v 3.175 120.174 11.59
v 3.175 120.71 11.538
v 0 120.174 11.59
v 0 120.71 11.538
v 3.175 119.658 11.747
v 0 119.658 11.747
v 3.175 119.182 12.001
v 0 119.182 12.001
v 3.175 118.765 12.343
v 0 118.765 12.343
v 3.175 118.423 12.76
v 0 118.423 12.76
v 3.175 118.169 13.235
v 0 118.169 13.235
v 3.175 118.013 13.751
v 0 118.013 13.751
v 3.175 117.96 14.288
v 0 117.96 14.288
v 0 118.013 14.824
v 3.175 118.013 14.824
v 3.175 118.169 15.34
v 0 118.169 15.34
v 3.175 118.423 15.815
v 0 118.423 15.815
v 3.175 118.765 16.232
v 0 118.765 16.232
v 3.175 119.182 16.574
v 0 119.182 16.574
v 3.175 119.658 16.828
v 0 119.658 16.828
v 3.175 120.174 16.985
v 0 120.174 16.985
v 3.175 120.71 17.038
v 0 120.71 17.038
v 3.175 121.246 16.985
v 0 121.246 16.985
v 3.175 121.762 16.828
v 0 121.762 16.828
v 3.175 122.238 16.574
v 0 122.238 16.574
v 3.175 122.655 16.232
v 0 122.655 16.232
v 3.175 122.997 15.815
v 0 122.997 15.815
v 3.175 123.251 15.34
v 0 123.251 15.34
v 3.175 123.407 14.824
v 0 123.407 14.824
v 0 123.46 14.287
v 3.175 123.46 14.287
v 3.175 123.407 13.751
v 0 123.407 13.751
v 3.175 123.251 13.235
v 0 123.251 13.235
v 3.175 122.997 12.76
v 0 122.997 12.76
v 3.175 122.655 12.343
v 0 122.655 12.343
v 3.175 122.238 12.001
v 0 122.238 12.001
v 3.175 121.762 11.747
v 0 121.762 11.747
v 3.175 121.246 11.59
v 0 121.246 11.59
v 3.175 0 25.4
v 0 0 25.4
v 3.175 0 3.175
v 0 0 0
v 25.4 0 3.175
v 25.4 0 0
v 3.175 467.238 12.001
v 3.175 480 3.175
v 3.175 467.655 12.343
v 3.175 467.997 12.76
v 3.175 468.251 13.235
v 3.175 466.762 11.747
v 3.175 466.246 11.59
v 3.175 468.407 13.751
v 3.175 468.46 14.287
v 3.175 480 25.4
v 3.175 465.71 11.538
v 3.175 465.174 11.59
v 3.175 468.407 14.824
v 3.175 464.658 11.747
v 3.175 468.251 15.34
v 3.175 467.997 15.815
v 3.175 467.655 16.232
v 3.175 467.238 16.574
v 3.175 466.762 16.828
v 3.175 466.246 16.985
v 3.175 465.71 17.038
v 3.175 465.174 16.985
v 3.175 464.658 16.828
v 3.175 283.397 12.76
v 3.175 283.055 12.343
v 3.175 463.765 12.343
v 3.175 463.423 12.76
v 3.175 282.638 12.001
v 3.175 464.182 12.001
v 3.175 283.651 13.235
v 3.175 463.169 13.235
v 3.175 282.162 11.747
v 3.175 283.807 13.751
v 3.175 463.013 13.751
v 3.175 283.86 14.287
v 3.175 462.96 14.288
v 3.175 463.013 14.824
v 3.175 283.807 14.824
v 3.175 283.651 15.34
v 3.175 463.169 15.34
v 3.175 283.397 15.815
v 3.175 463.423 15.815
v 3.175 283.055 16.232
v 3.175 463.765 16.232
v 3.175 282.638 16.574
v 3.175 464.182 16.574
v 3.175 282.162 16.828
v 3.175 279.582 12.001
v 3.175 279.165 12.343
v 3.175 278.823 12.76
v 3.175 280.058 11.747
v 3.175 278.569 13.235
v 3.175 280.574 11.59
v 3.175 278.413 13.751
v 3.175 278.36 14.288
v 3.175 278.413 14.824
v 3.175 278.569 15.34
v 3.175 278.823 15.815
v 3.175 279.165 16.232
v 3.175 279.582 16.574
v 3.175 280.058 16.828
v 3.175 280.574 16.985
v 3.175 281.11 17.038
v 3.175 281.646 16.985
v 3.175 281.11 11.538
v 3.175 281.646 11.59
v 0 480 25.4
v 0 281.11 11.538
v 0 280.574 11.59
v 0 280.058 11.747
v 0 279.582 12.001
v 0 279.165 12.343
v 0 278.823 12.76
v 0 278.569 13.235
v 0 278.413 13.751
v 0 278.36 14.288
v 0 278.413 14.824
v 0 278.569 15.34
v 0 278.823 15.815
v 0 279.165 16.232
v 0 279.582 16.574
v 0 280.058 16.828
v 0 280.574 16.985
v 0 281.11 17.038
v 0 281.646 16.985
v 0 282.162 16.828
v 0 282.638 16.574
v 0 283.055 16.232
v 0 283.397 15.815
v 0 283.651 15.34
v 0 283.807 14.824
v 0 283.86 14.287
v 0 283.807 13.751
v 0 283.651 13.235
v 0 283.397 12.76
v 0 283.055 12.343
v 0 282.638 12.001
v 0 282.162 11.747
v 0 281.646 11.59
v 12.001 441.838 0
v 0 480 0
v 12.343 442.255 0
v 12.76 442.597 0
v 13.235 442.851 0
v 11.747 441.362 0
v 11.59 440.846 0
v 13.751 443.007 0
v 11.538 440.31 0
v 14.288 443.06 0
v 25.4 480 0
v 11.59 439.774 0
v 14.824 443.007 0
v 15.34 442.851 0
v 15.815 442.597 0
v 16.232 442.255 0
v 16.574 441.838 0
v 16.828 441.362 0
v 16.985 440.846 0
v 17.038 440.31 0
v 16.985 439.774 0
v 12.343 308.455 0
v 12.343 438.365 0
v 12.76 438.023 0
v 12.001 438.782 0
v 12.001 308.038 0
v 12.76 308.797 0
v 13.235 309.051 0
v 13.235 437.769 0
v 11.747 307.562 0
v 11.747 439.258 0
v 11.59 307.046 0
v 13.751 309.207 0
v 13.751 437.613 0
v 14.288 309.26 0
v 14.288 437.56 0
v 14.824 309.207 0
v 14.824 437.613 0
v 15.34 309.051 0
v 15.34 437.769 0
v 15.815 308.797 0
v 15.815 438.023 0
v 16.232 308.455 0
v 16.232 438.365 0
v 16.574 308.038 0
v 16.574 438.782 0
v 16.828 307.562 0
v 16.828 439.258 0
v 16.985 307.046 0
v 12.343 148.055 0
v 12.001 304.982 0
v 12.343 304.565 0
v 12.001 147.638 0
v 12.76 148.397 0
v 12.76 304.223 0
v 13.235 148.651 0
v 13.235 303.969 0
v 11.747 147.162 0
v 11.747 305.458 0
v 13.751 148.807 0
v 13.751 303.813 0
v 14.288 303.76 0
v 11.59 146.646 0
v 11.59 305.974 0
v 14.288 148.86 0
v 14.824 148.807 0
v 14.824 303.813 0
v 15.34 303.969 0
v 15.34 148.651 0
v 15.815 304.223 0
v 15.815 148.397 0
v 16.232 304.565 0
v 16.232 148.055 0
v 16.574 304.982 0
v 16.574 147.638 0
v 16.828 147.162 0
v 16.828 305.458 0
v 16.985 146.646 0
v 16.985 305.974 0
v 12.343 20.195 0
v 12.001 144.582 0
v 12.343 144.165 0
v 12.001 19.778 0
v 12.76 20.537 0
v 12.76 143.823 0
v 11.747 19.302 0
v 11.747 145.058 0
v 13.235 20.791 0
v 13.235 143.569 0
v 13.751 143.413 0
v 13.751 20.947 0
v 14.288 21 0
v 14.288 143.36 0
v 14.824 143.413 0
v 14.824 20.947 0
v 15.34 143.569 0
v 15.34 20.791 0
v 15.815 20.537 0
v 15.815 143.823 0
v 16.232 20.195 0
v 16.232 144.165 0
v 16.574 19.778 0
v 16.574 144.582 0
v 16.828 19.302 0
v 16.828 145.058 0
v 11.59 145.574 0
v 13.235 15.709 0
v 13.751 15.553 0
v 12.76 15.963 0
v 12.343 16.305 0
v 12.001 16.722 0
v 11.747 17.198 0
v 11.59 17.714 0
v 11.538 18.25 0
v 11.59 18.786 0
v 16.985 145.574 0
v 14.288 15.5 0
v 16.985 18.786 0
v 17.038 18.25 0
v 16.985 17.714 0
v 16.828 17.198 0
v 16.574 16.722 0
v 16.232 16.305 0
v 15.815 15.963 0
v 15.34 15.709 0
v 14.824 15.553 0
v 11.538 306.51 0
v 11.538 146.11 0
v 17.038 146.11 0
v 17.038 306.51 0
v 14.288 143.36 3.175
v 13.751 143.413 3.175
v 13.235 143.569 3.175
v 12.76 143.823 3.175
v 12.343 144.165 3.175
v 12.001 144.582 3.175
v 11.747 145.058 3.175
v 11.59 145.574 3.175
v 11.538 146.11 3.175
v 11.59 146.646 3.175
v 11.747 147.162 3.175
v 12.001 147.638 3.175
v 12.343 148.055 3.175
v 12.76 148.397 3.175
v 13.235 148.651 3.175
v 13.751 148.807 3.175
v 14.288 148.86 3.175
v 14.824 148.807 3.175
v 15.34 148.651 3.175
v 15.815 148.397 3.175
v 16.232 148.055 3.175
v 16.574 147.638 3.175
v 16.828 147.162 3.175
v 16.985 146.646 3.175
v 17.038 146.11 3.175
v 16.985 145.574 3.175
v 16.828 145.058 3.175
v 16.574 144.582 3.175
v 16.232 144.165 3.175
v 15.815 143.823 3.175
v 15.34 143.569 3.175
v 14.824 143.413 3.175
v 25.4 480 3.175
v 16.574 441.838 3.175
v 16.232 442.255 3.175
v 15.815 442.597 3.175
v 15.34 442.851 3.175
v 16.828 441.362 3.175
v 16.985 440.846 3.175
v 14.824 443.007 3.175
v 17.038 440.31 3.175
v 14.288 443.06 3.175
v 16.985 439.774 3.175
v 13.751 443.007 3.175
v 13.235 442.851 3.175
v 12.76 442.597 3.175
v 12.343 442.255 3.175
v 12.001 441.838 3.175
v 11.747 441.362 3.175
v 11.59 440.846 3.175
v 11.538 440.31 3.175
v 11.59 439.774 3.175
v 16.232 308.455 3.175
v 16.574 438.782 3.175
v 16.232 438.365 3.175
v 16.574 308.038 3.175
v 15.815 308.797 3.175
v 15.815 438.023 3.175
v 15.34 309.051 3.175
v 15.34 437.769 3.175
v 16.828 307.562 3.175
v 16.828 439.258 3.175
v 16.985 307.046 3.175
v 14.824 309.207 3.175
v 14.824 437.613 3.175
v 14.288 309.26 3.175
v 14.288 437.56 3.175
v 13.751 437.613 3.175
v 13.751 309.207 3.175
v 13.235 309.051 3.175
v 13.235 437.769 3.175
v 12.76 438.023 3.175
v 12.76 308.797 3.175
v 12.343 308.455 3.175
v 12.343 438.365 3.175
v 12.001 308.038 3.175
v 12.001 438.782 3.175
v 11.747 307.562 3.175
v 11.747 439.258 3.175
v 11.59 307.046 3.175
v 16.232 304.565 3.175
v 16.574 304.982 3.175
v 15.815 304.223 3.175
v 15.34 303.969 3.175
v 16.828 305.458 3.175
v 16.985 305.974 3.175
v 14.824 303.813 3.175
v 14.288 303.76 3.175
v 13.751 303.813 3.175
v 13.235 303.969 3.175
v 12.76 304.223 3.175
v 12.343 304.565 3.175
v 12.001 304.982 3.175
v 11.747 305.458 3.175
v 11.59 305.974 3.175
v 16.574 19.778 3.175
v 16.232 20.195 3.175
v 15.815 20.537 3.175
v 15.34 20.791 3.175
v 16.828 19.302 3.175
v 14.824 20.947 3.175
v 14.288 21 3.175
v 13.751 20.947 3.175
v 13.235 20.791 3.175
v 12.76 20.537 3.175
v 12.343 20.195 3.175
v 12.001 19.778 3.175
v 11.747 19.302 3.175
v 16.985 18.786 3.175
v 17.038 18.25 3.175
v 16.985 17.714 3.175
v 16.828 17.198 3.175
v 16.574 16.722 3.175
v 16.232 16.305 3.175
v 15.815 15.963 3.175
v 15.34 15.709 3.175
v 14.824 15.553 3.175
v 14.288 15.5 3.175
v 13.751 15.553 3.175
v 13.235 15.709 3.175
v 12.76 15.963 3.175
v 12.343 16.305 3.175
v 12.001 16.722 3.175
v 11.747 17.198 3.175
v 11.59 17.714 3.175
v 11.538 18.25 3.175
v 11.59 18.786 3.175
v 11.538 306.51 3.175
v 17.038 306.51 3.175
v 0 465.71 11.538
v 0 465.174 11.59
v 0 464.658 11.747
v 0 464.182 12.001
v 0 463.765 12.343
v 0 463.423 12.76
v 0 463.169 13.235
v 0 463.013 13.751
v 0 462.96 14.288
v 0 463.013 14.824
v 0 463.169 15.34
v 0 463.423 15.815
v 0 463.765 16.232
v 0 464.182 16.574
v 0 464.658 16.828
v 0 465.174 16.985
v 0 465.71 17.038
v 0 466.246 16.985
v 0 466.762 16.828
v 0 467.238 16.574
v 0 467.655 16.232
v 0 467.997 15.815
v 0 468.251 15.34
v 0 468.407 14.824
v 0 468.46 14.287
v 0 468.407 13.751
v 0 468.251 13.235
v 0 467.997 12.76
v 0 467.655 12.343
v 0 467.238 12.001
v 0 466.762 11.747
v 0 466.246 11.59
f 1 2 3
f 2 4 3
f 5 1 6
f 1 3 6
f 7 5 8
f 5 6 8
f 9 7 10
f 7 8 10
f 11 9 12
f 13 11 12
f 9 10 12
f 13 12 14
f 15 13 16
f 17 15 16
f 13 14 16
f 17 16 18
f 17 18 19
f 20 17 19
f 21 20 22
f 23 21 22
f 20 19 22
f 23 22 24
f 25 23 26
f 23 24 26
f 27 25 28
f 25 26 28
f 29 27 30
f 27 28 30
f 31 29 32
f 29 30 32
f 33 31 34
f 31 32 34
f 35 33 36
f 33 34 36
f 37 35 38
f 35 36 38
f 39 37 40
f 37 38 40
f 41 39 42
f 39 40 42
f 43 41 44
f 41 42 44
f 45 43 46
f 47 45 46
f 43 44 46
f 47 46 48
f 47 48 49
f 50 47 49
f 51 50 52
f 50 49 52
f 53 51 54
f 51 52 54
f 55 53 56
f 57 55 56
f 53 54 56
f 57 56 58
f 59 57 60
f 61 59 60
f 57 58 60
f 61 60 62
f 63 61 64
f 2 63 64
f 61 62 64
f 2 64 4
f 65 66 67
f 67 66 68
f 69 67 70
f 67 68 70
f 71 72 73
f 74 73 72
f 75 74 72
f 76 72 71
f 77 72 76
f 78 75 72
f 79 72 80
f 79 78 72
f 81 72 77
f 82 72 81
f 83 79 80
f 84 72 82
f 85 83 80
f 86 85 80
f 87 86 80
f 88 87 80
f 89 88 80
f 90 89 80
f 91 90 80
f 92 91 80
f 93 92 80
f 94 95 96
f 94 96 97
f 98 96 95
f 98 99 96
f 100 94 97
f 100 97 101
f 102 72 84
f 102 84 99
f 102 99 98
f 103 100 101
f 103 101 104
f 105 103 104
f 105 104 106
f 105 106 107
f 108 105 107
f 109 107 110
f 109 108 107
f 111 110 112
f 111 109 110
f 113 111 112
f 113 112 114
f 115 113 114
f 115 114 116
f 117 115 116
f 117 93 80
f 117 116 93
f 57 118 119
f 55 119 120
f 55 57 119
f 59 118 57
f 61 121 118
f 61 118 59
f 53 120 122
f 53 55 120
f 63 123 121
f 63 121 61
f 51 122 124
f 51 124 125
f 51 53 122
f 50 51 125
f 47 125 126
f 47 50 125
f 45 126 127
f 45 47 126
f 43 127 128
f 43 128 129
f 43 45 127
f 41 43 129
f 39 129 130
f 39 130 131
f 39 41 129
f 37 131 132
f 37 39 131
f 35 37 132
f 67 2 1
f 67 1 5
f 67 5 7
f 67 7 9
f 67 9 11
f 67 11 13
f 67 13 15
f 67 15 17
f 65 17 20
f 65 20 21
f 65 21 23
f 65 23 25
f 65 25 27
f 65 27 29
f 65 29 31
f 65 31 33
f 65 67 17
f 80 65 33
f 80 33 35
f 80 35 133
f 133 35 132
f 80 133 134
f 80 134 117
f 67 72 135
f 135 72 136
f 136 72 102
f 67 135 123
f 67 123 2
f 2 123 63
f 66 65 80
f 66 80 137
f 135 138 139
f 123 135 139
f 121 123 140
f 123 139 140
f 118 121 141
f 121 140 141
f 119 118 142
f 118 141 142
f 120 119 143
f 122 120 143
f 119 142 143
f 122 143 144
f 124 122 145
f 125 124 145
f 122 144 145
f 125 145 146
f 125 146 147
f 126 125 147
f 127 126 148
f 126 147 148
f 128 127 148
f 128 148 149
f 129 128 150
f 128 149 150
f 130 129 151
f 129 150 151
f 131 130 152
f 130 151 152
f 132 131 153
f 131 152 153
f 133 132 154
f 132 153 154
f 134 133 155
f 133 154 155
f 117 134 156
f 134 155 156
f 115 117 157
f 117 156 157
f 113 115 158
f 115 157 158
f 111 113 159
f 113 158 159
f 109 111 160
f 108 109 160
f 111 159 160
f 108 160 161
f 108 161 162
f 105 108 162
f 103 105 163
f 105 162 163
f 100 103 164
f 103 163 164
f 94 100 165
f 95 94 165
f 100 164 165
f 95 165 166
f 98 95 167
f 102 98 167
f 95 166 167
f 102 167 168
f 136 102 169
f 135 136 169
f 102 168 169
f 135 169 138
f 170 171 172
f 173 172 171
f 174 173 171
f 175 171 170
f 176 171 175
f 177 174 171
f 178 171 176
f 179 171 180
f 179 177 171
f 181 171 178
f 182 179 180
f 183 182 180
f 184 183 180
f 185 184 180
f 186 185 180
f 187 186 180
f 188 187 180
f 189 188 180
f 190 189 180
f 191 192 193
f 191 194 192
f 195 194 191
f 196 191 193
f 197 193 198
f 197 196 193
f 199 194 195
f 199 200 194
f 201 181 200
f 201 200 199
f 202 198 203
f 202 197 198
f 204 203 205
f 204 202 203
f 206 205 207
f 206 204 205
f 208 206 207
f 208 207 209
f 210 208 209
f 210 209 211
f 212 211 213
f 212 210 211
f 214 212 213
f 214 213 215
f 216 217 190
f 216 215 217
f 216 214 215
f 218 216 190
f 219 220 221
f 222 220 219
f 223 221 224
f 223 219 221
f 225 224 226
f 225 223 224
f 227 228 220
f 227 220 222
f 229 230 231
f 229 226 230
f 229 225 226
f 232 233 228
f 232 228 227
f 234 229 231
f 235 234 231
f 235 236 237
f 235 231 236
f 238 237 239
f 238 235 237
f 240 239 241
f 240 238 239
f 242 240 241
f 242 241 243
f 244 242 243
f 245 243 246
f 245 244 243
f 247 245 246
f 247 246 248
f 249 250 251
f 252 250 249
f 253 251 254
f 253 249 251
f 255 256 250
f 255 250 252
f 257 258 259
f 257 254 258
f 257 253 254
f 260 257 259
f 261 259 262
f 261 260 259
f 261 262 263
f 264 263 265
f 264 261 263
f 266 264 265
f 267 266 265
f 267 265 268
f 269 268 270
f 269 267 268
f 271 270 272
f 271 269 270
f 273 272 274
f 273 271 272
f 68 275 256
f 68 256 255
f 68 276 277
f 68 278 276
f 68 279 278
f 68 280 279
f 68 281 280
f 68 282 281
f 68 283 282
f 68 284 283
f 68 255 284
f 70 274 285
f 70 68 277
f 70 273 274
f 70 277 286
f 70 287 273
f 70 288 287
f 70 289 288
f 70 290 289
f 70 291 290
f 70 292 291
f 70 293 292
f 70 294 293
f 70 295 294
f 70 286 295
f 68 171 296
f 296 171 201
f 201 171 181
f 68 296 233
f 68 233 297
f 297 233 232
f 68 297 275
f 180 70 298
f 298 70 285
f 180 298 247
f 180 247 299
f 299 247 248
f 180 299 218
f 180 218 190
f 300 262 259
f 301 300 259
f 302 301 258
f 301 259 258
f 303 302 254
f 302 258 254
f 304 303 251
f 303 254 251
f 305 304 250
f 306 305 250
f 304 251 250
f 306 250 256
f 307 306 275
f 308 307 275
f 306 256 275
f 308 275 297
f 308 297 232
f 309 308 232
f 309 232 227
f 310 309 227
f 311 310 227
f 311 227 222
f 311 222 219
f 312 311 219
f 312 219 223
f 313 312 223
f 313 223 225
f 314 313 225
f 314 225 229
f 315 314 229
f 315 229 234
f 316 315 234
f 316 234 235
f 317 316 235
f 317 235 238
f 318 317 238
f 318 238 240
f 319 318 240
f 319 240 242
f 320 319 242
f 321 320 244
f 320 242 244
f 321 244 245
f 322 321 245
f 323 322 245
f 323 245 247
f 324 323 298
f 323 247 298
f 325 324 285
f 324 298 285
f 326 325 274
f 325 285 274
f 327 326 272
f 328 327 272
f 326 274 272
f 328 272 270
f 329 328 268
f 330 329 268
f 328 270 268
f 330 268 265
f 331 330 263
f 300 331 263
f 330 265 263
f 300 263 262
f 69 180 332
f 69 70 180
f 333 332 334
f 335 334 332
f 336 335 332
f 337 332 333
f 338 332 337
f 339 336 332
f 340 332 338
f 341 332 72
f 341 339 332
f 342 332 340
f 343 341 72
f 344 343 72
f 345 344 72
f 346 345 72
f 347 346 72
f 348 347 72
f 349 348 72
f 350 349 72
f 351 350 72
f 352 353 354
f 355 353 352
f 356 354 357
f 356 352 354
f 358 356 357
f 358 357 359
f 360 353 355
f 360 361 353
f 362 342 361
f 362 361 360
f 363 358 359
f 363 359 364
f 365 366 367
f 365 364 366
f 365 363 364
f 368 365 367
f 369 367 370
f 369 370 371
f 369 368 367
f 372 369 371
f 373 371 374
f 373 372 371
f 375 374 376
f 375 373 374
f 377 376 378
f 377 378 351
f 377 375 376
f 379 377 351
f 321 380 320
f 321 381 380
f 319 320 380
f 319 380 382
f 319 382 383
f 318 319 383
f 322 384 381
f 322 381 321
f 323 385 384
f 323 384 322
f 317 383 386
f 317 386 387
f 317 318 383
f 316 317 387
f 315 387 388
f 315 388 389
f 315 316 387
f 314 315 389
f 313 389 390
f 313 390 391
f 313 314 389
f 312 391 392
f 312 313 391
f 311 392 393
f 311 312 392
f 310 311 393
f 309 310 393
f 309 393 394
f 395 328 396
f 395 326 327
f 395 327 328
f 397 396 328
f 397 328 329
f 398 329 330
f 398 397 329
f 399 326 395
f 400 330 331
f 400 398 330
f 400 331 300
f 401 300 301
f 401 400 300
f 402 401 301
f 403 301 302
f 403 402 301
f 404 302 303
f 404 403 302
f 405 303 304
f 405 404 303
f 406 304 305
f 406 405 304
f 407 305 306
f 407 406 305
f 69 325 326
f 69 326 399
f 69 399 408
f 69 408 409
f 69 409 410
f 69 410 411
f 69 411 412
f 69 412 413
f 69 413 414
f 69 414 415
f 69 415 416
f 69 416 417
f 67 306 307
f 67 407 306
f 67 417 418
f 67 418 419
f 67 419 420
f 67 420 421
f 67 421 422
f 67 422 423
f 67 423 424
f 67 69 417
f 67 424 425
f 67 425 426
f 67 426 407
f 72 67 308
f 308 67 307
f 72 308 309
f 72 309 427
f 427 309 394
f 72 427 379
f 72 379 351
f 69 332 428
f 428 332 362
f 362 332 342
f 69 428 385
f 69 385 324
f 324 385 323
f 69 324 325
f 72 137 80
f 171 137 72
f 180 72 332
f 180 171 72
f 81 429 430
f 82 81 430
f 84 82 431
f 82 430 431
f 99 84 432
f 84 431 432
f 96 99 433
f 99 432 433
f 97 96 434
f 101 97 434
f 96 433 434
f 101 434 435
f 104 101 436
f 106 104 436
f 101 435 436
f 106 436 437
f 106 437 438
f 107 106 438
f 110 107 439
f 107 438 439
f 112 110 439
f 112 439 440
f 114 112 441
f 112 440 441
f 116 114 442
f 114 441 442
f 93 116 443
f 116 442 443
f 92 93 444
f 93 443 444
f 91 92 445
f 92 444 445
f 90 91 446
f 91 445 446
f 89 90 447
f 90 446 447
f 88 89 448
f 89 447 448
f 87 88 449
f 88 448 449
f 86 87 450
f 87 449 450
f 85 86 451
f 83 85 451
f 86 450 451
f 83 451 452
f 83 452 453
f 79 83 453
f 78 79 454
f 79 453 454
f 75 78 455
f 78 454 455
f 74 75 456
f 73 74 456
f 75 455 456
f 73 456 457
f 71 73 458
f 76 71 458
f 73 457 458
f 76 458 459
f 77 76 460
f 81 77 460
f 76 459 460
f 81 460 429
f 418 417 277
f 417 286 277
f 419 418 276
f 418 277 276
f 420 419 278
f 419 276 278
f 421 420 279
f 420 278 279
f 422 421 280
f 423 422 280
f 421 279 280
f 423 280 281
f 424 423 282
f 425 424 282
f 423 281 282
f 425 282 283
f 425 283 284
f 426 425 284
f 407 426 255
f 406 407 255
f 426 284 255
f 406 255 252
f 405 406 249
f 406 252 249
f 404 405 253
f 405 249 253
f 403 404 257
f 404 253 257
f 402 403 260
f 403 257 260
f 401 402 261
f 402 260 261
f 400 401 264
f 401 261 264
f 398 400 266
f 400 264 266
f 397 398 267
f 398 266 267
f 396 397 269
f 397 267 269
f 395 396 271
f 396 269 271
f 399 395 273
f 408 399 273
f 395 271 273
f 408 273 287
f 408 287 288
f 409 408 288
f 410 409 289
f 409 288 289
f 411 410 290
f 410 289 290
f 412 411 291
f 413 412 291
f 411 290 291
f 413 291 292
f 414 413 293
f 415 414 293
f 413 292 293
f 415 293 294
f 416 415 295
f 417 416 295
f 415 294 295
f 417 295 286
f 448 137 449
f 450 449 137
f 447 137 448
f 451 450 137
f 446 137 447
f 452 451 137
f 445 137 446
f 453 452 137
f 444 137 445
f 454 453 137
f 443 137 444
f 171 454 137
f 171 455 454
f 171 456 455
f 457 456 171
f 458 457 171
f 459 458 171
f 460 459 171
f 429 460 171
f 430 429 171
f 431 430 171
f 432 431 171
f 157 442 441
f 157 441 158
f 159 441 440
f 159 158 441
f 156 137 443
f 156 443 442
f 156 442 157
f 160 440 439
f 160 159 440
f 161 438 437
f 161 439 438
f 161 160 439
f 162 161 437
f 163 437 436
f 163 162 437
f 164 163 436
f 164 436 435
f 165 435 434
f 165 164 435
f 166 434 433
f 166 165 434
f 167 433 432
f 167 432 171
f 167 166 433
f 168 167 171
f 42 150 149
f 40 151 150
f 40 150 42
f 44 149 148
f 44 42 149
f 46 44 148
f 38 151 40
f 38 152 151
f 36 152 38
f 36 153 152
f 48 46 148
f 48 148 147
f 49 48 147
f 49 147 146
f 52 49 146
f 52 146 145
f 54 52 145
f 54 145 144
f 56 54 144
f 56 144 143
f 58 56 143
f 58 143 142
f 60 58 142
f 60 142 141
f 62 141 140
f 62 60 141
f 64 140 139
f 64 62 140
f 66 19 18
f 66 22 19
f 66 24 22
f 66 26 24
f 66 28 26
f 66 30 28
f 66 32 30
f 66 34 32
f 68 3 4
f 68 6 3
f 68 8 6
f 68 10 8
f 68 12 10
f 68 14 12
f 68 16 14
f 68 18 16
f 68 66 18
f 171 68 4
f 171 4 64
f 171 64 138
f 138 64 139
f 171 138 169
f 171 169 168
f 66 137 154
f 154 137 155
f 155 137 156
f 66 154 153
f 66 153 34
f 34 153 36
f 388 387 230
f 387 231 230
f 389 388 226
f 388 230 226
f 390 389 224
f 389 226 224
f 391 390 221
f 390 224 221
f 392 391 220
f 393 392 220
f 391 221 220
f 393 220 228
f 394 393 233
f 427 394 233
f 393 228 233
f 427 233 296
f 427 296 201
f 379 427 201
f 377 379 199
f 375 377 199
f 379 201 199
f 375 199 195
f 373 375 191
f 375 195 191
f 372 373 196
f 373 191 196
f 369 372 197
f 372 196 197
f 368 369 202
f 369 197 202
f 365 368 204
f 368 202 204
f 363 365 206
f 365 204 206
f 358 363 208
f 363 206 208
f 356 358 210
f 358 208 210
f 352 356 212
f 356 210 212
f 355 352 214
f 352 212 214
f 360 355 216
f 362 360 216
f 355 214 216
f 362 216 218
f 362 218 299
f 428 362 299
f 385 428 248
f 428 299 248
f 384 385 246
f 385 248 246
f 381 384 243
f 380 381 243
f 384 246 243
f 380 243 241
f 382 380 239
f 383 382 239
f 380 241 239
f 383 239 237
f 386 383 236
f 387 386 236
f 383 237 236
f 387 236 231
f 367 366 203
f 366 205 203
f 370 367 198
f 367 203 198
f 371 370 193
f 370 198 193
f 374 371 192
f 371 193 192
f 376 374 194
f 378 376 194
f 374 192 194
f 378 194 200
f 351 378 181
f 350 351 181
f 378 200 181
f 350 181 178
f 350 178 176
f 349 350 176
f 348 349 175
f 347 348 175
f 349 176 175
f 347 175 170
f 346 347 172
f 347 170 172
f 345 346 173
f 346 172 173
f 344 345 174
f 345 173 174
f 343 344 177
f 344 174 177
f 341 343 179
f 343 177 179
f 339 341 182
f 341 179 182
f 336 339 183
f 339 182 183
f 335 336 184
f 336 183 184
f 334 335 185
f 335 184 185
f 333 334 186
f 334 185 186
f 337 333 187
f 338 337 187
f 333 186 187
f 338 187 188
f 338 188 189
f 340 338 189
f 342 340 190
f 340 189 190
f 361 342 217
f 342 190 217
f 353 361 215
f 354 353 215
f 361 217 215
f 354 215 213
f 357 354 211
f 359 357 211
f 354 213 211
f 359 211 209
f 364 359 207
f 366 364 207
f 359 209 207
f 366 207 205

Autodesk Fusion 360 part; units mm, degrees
sketch "Sketch1" plane through (0, 0, 0) normal (0, 1, 0) x (1, 0, 0)
  line L0 (0, 0) -> (25.4, 0)
  line L1 (25.4, 0) -> (25.4, -3.175)
  line L2 (25.4, -3.175) -> (3.175, -3.175)
  line L3 (3.175, -3.175) -> (3.175, -25.4)
  line L4 (3.175, -25.4) -> (0, -25.4)
  line L5 (0, -25.4) -> (0, 0)
  dimension "d1" = 25.4
  dimension "d2" = 25.4
  dimension "d3" = 3.175
  dimension "d4" = 3.175
extrude "Extrude1" add sketch "Sketch1" along normal blind 480
sketch "Sketch2" plane through (0, 0, 3.175) normal (0, 0, 1) x (1, 0, 0)
  line L0 (3.175, 0) -> (25.4, 0)
  line L1 (25.4, 0) -> (25.4, 480)
  line L2 (25.4, 480) -> (3.175, 480)
  line L3 (3.175, 480) -> (3.175, 0)
  circle A0 centre (14.2875, 18.25) radius 2.75
  circle A1 centre (14.2875, 146.11) radius 2.75
  circle A2 centre (14.2875, 306.51) radius 2.75
  circle A3 centre (14.2875, 440.31) radius 2.75
  line L4 (14.2875, 480) -> (14.2875, 0) construction
  dimension "d7" = 18.25
  dimension "d8" = 146.11
  dimension "d9" = 306.51
  dimension "d10" = 440.31
  dimension "d11" = 5.5
sketch "Sketch3" plane through (3.175, 0, 0) normal (1, 0, 0) x (0, 0, -1)
  line L0 (-25.4, 0) -> (-3.175, 0)
  line L1 (-3.175, 0) -> (-3.175, 480)
  line L2 (-3.175, 480) -> (-25.4, 480)
  line L3 (-25.4, 480) -> (-25.4, 0)
  circle A0 centre (-14.2875, 120.71) radius 2.75
  circle A1 centre (-14.2875, 281.11) radius 2.75
  circle A2 centre (-14.2875, 465.71) radius 2.75
  line L4 (-14.2875, 480) -> (-14.2875, 0) construction
  dimension "d12" = 120.71
  dimension "d13" = 5.5
  dimension "d14" = 281.11
  dimension "d15" = 465.71
hole "Hole1" at (3.175, 465.71, 14.2875) at (3.175, 281.11, 14.2875) at (3.175, 120.71, 14.2875) direction (-1, 0, 0) diameter 5.5 depth 7 tip angle 118
hole "Hole2" at (14.2875, 440.31, 3.175) at (14.2875, 306.51, 3.175) at (14.2875, 146.11, 3.175) at (14.2875, 18.25, 3.175) direction (0, 0, -1) diameter 5.5 depth 7 tip angle 118
equation "d3 = ( 1 / 8 ) * 1 in"
equation "d4 = ( 1 / 8 ) * 1 in"
equation "d8 = 135 mm + 11.11 mm"
equation "d9 = 295.4 mm + 11.11 mm"
equation "d10 = 429.2 mm + 11.11 mm"
equation "d12 = 109.6 mm + 11.11 mm"
equation "d14 = 270 mm + 11.11 mm"
equation "d15 = 454.6 mm + 11.11 mm"
